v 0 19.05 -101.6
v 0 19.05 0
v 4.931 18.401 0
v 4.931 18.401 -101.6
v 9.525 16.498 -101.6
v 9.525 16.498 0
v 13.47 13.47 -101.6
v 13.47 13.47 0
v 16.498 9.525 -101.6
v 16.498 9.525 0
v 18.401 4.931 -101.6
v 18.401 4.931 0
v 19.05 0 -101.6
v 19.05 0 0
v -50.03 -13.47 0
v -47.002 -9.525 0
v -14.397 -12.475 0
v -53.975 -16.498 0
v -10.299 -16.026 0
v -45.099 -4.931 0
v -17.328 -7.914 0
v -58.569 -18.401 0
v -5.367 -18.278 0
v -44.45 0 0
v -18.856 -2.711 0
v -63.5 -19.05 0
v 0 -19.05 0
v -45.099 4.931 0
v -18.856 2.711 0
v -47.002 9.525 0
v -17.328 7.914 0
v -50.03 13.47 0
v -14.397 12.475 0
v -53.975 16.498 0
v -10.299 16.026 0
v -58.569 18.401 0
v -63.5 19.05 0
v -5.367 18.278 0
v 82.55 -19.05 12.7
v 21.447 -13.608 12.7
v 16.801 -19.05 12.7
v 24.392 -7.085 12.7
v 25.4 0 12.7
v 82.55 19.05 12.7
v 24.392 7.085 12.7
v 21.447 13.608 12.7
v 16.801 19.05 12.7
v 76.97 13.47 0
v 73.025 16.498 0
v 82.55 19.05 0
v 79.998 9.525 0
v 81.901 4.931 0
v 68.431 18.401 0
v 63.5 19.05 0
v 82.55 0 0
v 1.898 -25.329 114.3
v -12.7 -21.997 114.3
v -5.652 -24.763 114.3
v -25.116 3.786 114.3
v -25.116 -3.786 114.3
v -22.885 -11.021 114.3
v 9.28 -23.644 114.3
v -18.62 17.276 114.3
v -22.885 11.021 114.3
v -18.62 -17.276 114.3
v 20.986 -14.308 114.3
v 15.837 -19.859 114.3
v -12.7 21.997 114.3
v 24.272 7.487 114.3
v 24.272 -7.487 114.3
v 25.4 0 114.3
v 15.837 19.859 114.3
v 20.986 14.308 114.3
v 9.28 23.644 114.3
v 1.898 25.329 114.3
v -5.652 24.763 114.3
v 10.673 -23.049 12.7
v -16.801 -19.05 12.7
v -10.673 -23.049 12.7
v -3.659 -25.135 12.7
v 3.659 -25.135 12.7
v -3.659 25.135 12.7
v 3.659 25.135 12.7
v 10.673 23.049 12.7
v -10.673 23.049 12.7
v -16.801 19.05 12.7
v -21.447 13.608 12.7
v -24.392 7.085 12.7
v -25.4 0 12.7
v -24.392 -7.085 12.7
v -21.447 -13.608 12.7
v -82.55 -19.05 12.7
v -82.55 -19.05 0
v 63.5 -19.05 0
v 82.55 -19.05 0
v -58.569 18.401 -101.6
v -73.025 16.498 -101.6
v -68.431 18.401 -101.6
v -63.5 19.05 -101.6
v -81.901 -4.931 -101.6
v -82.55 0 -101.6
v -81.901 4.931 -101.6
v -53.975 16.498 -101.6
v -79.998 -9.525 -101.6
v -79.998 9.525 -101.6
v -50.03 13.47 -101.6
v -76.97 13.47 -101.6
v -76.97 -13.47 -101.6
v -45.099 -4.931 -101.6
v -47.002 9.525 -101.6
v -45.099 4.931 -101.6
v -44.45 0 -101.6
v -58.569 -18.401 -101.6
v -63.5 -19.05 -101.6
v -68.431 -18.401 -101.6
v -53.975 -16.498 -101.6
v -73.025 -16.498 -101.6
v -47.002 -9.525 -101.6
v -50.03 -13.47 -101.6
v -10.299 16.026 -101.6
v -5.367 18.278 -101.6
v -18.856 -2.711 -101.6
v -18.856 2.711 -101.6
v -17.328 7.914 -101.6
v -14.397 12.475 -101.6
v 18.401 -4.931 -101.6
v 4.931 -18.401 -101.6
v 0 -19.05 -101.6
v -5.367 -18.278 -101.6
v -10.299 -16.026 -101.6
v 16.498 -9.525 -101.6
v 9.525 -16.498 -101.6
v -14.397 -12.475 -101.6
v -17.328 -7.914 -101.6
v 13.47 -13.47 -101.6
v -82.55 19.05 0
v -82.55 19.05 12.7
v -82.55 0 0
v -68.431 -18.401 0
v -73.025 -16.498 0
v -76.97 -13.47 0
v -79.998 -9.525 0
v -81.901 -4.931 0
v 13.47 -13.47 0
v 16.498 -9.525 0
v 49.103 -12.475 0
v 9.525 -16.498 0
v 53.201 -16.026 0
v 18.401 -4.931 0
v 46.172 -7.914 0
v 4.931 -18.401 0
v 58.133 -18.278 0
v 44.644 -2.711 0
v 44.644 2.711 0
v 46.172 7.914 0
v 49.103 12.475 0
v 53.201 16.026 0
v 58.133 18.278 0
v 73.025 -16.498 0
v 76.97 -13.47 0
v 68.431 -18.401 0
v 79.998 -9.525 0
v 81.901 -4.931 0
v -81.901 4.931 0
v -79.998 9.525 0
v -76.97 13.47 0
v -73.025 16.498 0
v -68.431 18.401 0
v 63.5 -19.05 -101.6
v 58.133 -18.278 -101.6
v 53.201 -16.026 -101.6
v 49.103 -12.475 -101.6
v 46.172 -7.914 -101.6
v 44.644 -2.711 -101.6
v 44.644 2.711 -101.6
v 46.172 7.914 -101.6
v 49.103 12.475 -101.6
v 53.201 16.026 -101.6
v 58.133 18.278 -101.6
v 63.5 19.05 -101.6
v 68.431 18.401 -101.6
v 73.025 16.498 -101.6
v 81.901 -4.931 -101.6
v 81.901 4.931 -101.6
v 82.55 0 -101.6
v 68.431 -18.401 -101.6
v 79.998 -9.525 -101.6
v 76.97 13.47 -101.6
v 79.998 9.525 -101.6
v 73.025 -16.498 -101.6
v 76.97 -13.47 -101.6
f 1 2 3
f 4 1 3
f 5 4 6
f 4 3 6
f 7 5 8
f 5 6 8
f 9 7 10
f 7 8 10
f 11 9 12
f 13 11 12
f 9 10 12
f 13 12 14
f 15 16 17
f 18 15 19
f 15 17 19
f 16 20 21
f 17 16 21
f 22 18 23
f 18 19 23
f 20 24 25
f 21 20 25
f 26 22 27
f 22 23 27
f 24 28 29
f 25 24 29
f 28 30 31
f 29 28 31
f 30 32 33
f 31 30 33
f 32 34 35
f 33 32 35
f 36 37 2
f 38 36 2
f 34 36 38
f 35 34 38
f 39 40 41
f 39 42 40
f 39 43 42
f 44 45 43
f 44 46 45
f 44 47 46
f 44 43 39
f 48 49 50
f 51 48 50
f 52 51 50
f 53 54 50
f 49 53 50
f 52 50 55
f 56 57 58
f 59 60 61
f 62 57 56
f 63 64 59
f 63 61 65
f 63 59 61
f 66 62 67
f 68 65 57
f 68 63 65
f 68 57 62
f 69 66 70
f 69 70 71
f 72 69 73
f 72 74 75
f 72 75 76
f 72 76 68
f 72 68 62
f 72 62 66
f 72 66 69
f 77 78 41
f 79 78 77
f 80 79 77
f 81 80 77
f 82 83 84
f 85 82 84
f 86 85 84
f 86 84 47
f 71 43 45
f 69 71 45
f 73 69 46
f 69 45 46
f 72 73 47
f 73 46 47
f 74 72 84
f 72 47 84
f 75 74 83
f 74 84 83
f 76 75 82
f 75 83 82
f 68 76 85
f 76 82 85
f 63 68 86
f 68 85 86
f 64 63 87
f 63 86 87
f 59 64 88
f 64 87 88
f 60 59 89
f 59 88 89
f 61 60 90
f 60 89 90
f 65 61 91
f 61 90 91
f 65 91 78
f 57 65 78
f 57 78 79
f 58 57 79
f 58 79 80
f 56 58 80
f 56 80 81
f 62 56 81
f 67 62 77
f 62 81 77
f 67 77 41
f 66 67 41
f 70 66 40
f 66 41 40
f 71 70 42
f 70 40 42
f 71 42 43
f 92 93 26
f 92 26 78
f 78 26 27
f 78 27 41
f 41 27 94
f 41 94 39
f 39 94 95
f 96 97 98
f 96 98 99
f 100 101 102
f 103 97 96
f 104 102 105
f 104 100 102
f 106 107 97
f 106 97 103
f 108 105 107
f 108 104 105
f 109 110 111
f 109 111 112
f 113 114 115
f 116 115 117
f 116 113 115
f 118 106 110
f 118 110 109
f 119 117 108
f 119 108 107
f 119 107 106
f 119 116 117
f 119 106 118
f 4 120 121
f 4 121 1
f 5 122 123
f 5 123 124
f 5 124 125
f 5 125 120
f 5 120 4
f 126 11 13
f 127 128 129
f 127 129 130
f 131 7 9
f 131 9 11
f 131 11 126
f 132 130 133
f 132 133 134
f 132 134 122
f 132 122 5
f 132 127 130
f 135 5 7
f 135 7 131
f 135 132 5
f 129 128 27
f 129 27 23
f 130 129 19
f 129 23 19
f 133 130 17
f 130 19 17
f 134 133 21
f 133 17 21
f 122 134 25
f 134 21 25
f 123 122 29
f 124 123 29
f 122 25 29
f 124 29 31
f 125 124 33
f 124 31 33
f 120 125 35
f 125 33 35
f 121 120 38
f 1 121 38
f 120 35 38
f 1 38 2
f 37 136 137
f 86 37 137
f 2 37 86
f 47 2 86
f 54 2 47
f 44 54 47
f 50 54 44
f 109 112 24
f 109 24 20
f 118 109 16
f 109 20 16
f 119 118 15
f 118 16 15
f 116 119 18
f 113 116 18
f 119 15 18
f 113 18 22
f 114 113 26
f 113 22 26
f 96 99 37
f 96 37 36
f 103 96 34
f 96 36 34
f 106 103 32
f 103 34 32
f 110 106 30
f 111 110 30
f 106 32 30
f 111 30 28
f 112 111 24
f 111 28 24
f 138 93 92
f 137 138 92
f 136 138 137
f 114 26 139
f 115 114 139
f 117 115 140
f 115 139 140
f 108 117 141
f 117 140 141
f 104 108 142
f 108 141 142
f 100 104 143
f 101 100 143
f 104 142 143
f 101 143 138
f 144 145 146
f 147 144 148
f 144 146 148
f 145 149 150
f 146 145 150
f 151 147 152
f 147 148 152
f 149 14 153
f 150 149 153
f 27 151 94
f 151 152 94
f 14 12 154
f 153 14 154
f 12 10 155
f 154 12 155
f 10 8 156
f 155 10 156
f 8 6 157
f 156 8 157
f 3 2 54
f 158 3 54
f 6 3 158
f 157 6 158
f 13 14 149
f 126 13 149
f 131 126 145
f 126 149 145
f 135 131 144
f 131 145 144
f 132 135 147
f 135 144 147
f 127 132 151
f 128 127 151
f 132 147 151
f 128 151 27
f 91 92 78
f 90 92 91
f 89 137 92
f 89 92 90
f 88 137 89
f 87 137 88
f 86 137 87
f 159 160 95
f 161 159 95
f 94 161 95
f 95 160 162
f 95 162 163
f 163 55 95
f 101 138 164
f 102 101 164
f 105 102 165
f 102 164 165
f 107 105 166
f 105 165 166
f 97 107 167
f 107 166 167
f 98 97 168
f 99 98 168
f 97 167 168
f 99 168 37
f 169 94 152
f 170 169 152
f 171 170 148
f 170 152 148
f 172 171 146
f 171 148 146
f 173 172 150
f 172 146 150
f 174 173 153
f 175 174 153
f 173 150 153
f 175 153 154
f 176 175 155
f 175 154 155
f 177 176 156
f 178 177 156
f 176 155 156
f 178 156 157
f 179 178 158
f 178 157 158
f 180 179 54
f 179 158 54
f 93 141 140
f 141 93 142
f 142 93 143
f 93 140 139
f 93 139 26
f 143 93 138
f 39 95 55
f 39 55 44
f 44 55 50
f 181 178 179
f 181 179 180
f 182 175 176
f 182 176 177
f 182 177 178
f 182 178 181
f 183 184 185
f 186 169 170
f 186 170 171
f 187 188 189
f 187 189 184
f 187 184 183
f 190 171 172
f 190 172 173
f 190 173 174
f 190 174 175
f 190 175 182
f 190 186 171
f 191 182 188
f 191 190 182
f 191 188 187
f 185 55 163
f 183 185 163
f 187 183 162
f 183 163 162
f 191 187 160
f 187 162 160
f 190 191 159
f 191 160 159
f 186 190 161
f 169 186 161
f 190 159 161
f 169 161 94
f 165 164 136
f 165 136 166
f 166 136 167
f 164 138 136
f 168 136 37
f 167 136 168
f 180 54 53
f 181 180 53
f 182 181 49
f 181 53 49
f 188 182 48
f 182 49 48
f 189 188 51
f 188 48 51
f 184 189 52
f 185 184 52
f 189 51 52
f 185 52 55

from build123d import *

# Parameters (mm, degrees)
F0_W     = 165.1
F0_H     = 38.1
F1_DEPTH = 12.7
F2_R     = 25.4
F3_DEPTH = 101.6
F5_DEPTH = 101.6


with BuildPart() as f1:
    # F0 (on Top) → F1 (new body)
    with BuildSketch(Plane.XY):
        Rectangle(F0_W, F0_H)
    extrude(amount=F1_DEPTH)

    # F2 (on face) → F3 (join)
    with BuildSketch(Plane.XY.offset(12.7)):
        Circle(F2_R)
    extrude(amount=F3_DEPTH)

    # F4 (on face) → F5 (join)
    with BuildSketch(Plane(origin=(0, 0, 0), x_dir=(1, 0, 0), z_dir=(0, 0, -1))):
        with BuildLine():
            ThreePointArc((0, -19.05), (13.470384, -13.470384), (19.05, 0))
            ThreePointArc((19.05, 0), (13.470384, 13.470384), (0, 19.05))
            ThreePointArc((0, 19.05), (-19.05, 0), (0, -19.05))
        make_face()
        with BuildLine():
            ThreePointArc((82.55, 0), (76.970384, 13.470384), (63.5, 19.05))
            ThreePointArc((63.5, 19.05), (44.45, 0), (63.5, -19.05))
            ThreePointArc((63.5, -19.05), (76.970384, -13.470384), (82.55, 0))
        make_face()
        with BuildLine():
            ThreePointArc((-44.45, 0), (-50.029616, 13.470384), (-63.5, 19.05))
            ThreePointArc((-63.5, 19.05), (-76.970384, 13.470384), (-82.55, 0))
            ThreePointArc((-82.55, 0), (-76.970384, -13.470384), (-63.5, -19.05))
            ThreePointArc((-63.5, -19.05), (-50.029616, -13.470384), (-44.45, 0))
        make_face()
    extrude(amount=F5_DEPTH)


solid = f1.part
